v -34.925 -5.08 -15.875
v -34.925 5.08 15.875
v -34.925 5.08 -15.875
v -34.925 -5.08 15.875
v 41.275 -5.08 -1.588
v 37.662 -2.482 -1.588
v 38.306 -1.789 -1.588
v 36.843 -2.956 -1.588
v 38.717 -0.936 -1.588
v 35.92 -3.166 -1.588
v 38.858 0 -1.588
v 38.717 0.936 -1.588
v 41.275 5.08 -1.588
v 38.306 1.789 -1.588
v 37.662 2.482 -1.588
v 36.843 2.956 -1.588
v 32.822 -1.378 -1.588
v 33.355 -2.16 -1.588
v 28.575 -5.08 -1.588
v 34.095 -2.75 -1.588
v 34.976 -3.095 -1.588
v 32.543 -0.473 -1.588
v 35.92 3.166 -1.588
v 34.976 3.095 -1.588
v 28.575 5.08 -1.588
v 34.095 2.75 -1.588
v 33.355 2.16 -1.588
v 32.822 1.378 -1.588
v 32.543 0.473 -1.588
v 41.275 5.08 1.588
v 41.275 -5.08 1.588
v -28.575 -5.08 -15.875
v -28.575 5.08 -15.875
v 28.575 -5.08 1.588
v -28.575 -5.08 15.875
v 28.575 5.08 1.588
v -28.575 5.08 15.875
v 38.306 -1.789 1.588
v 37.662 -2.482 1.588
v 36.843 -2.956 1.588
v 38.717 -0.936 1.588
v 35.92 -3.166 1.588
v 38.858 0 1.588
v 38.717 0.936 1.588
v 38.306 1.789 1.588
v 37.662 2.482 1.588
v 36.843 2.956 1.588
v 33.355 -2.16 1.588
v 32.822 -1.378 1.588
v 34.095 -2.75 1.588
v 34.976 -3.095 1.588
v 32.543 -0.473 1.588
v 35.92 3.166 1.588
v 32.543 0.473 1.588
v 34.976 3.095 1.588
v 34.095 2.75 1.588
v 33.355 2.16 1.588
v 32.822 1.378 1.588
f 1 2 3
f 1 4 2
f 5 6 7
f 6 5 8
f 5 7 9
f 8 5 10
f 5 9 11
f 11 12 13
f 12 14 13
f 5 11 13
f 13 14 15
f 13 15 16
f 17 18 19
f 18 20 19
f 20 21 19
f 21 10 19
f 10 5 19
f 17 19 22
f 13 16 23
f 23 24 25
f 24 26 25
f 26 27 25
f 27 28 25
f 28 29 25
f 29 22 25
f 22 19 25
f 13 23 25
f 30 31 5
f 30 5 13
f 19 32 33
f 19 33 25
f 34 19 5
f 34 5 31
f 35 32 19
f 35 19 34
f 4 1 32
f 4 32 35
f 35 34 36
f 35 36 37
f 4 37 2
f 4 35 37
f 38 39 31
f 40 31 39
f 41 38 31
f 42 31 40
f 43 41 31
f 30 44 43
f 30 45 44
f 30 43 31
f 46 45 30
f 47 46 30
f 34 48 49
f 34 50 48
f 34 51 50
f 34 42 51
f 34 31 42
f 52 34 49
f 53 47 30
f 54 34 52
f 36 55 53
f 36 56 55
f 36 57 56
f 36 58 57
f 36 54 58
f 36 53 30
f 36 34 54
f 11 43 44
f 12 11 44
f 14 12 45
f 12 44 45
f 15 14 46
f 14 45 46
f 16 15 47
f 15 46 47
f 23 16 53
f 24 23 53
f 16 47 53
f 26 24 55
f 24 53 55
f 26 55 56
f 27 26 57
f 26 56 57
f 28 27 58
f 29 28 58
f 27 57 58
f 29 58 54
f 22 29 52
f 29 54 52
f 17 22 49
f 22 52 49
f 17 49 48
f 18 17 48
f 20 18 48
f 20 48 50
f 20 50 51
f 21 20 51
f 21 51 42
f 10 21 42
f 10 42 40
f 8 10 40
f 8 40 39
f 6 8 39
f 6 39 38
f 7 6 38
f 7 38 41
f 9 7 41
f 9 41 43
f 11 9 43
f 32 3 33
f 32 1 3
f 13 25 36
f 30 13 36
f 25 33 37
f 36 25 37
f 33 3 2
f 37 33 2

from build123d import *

# Parameters (mm, degrees)
F1_DEPTH = 5.08
F2_W     = 10.16
F2_H     = 3.175
F3_DEPTH = 12.7
F4_R     = 3.175
F5_DEPTH = 25.4


with BuildPart() as f1:
    # F0 (on Front) → F1 (new body, symmetric)
    with BuildSketch(Plane.XZ):
        Polygon((-34.925, -15.875), (-28.575, -15.875), (28.575, -1.5875), (28.575, 1.5875), (-28.575, 15.875), (-34.925, 15.875), align=None)
    extrude(amount=F1_DEPTH, both=True)

    # F2 (on face) → F3 (join)
    with BuildSketch(Plane.YZ.offset(28.575)):
        Rectangle(F2_W, F2_H)
    extrude(amount=F3_DEPTH)

    # F4 (on face) → F5 (cut)
    with BuildSketch(Plane.XY.offset(1.5875)):
        with Locations((35.682857, 0)):
            Circle(F4_R)
    extrude(amount=-F5_DEPTH, mode=Mode.SUBTRACT)


solid = f1.part
